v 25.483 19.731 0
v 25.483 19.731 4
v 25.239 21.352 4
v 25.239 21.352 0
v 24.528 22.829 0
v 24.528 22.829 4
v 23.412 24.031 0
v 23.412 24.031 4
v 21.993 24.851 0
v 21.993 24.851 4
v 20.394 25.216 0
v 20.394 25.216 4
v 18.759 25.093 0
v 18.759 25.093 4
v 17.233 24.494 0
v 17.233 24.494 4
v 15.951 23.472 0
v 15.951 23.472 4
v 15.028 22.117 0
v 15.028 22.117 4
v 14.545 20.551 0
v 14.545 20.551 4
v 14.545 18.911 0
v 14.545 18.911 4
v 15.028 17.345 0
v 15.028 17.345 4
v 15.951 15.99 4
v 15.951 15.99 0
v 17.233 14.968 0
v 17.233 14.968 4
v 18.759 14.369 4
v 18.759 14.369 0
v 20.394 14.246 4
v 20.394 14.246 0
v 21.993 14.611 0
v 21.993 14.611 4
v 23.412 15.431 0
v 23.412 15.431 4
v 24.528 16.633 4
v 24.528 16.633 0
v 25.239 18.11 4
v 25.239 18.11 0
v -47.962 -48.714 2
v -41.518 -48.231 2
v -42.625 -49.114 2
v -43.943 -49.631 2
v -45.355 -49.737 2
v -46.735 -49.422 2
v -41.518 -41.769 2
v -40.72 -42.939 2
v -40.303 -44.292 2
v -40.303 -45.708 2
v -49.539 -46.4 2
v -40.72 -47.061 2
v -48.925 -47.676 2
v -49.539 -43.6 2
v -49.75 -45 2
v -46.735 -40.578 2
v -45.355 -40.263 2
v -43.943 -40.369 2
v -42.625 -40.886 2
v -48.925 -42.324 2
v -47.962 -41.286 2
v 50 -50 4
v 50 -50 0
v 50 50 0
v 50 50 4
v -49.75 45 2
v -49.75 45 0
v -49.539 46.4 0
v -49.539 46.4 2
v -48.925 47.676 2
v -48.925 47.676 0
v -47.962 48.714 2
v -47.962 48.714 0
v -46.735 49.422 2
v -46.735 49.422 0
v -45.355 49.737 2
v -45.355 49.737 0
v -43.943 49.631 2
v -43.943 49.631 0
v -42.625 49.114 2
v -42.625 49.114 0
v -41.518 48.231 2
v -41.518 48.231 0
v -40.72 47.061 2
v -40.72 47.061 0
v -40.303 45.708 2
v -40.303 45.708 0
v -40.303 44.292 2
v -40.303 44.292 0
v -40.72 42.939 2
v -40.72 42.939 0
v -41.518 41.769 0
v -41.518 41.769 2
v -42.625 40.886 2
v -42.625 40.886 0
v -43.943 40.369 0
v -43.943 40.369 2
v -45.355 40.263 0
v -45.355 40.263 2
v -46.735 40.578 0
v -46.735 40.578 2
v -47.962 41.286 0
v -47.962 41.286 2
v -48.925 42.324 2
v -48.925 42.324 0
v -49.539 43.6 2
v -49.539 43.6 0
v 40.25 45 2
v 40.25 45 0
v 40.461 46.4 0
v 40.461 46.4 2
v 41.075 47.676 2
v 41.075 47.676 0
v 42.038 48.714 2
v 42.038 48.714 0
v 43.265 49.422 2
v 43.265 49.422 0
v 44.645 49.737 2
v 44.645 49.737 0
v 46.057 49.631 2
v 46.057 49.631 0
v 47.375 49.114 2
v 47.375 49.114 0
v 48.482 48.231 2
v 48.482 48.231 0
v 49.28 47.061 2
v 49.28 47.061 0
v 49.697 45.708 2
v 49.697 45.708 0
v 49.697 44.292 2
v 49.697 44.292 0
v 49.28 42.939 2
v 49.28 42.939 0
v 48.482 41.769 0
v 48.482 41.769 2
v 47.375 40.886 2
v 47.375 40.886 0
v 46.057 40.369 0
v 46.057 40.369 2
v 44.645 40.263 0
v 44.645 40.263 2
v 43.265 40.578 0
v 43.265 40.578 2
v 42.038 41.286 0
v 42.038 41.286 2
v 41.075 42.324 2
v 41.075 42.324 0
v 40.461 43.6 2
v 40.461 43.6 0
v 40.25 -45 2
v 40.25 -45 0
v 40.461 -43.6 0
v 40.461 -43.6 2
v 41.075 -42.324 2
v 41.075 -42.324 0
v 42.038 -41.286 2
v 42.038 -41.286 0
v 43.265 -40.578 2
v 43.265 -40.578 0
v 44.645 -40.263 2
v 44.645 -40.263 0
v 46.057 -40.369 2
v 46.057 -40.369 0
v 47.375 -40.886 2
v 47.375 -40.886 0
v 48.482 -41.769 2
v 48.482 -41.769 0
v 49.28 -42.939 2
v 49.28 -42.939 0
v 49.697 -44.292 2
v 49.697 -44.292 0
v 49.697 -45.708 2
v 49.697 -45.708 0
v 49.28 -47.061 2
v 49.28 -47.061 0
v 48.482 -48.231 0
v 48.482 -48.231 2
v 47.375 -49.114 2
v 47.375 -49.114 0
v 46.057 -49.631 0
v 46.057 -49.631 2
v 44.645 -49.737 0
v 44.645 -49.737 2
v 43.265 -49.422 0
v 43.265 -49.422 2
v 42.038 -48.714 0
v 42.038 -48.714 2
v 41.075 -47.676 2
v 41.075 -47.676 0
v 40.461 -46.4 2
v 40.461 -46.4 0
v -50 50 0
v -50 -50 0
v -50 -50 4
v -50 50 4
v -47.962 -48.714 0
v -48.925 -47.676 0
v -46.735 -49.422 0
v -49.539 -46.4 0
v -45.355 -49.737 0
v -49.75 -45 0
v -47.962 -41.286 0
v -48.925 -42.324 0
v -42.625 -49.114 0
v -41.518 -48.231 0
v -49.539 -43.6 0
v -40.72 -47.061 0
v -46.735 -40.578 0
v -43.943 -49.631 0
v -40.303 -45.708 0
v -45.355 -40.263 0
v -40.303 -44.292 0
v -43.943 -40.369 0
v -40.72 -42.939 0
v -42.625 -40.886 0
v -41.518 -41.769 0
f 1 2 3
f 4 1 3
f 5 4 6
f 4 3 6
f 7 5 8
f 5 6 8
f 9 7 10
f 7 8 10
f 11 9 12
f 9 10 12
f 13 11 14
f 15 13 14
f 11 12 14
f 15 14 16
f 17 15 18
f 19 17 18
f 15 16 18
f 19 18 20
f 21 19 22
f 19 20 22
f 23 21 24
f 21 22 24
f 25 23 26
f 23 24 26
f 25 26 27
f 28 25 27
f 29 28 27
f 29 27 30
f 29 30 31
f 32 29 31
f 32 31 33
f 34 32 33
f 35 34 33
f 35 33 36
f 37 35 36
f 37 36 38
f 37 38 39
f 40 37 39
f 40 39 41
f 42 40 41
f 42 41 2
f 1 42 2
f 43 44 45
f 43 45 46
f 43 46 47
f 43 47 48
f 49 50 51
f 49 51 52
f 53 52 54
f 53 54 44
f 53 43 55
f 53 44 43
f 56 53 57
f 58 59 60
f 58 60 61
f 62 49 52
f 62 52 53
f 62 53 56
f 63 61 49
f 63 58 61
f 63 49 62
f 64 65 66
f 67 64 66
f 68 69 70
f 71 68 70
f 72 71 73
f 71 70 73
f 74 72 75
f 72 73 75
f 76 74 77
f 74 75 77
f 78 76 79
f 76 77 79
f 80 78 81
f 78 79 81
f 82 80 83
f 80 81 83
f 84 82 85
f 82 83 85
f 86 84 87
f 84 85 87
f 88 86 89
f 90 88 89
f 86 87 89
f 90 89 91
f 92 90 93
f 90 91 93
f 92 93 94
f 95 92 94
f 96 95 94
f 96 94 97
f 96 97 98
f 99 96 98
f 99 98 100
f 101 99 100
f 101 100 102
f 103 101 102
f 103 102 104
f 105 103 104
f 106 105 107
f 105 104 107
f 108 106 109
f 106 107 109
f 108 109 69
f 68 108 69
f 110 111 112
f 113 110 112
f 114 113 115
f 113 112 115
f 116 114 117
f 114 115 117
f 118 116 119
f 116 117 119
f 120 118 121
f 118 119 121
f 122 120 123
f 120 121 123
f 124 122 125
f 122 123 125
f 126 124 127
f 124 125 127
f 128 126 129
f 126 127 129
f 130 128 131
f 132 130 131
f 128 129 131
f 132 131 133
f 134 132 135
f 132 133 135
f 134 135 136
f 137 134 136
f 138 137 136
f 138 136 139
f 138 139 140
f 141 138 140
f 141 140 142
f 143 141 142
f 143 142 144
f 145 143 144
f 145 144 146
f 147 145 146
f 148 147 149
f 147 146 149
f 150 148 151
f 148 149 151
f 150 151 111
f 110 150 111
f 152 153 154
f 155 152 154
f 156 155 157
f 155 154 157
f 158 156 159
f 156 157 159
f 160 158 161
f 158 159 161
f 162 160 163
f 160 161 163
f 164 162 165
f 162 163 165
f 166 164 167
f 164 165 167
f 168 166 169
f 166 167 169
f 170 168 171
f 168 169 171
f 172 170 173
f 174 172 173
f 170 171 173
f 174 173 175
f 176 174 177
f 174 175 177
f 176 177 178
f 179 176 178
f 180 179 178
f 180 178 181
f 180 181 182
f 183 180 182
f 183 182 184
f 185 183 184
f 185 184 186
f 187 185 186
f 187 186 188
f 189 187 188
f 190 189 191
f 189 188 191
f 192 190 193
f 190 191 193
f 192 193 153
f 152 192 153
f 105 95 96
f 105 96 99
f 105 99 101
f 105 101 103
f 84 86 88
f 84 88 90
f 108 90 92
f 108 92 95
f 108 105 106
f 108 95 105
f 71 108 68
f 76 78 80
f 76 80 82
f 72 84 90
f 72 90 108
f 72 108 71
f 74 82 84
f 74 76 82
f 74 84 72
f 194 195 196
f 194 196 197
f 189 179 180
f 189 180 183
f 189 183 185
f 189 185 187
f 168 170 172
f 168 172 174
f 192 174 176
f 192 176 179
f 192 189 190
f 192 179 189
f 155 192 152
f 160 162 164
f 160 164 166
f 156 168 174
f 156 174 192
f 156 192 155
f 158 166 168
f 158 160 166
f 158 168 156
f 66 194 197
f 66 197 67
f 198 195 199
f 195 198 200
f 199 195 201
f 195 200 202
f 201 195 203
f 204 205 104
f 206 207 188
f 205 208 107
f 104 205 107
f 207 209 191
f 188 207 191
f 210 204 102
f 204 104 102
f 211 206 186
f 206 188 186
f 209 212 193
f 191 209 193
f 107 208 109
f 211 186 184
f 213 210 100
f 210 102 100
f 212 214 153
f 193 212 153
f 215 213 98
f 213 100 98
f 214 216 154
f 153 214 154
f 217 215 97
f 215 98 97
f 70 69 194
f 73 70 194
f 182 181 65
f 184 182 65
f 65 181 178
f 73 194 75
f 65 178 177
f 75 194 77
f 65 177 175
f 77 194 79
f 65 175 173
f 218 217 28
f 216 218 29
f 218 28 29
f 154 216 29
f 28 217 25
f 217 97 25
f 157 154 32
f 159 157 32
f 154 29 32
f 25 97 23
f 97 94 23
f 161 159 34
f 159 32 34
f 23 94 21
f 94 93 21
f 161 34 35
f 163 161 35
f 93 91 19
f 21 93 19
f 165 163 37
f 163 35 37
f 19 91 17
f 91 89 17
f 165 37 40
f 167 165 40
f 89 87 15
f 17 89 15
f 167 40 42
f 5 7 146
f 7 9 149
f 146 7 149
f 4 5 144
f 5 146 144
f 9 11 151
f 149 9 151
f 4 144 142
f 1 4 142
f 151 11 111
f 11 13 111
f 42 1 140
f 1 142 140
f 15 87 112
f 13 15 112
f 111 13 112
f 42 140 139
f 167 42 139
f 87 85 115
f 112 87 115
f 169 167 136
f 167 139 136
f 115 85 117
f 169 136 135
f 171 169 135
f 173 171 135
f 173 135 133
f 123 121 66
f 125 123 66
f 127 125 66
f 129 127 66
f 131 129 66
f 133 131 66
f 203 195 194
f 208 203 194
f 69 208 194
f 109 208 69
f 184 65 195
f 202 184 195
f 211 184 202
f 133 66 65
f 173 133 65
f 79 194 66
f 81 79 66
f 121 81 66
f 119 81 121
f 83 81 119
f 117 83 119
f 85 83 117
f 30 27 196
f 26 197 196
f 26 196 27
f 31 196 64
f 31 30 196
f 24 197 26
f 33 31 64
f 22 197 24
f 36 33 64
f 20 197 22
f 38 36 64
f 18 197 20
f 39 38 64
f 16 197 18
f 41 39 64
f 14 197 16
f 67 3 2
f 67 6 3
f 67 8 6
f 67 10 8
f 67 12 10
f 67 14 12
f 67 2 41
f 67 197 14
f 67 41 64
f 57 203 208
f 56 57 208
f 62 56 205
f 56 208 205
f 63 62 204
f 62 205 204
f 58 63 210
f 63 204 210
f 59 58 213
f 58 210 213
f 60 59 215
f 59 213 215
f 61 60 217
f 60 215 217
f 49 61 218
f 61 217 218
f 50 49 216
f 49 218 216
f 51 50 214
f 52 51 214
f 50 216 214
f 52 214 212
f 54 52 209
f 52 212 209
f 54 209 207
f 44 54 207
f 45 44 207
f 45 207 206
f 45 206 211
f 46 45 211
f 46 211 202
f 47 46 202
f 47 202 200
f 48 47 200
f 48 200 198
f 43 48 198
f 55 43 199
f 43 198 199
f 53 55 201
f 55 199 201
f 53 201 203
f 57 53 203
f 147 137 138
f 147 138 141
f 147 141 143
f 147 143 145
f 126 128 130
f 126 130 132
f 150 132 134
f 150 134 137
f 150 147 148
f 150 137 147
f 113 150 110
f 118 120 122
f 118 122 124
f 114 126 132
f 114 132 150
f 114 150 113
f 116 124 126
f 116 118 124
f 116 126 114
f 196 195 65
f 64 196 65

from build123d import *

# Parameters (mm, degrees)
SKETCH1_W           = 100
SKETCH1_H           = 100
BOSS_EXTRUDE1_DEPTH = 4
SKETCH2_R           = 4.75
CUT_EXTRUDE1_DEPTH  = 2
SKETCH3_R           = 5.5
CUT_EXTRUDE2_DEPTH  = 5


with BuildPart() as part:
    # Sketch1 → Boss-Extrude1 (new body)
    with BuildSketch(Plane.XY):
        Rectangle(SKETCH1_W, SKETCH1_H)
    extrude(amount=BOSS_EXTRUDE1_DEPTH)

    # Sketch2 → Cut-Extrude1 (cut)
    with BuildSketch(Plane(origin=(0, 0, 0), x_dir=(-1, 0, 0), z_dir=(0, 0, -1))):
        with Locations((45, 45)):
            Circle(SKETCH2_R)
        with Locations((45, -45)):
            Circle(SKETCH2_R)
        with Locations((-45, -45)):
            Circle(SKETCH2_R)
        with Locations((-45, 45)):
            Circle(SKETCH2_R)
    extrude(amount=-CUT_EXTRUDE1_DEPTH, mode=Mode.SUBTRACT)

    # Sketch3 → Cut-Extrude2 (cut, through all)
    with BuildSketch(Plane(origin=(-38.404344239, -79.614153906, 4), x_dir=(1, 0, 0), z_dir=(0, 0, 1))):
        with Locations((58.387586461, 99.345162416)):
            Circle(SKETCH3_R)
    extrude(amount=-CUT_EXTRUDE2_DEPTH, mode=Mode.SUBTRACT)


solid = part.part
